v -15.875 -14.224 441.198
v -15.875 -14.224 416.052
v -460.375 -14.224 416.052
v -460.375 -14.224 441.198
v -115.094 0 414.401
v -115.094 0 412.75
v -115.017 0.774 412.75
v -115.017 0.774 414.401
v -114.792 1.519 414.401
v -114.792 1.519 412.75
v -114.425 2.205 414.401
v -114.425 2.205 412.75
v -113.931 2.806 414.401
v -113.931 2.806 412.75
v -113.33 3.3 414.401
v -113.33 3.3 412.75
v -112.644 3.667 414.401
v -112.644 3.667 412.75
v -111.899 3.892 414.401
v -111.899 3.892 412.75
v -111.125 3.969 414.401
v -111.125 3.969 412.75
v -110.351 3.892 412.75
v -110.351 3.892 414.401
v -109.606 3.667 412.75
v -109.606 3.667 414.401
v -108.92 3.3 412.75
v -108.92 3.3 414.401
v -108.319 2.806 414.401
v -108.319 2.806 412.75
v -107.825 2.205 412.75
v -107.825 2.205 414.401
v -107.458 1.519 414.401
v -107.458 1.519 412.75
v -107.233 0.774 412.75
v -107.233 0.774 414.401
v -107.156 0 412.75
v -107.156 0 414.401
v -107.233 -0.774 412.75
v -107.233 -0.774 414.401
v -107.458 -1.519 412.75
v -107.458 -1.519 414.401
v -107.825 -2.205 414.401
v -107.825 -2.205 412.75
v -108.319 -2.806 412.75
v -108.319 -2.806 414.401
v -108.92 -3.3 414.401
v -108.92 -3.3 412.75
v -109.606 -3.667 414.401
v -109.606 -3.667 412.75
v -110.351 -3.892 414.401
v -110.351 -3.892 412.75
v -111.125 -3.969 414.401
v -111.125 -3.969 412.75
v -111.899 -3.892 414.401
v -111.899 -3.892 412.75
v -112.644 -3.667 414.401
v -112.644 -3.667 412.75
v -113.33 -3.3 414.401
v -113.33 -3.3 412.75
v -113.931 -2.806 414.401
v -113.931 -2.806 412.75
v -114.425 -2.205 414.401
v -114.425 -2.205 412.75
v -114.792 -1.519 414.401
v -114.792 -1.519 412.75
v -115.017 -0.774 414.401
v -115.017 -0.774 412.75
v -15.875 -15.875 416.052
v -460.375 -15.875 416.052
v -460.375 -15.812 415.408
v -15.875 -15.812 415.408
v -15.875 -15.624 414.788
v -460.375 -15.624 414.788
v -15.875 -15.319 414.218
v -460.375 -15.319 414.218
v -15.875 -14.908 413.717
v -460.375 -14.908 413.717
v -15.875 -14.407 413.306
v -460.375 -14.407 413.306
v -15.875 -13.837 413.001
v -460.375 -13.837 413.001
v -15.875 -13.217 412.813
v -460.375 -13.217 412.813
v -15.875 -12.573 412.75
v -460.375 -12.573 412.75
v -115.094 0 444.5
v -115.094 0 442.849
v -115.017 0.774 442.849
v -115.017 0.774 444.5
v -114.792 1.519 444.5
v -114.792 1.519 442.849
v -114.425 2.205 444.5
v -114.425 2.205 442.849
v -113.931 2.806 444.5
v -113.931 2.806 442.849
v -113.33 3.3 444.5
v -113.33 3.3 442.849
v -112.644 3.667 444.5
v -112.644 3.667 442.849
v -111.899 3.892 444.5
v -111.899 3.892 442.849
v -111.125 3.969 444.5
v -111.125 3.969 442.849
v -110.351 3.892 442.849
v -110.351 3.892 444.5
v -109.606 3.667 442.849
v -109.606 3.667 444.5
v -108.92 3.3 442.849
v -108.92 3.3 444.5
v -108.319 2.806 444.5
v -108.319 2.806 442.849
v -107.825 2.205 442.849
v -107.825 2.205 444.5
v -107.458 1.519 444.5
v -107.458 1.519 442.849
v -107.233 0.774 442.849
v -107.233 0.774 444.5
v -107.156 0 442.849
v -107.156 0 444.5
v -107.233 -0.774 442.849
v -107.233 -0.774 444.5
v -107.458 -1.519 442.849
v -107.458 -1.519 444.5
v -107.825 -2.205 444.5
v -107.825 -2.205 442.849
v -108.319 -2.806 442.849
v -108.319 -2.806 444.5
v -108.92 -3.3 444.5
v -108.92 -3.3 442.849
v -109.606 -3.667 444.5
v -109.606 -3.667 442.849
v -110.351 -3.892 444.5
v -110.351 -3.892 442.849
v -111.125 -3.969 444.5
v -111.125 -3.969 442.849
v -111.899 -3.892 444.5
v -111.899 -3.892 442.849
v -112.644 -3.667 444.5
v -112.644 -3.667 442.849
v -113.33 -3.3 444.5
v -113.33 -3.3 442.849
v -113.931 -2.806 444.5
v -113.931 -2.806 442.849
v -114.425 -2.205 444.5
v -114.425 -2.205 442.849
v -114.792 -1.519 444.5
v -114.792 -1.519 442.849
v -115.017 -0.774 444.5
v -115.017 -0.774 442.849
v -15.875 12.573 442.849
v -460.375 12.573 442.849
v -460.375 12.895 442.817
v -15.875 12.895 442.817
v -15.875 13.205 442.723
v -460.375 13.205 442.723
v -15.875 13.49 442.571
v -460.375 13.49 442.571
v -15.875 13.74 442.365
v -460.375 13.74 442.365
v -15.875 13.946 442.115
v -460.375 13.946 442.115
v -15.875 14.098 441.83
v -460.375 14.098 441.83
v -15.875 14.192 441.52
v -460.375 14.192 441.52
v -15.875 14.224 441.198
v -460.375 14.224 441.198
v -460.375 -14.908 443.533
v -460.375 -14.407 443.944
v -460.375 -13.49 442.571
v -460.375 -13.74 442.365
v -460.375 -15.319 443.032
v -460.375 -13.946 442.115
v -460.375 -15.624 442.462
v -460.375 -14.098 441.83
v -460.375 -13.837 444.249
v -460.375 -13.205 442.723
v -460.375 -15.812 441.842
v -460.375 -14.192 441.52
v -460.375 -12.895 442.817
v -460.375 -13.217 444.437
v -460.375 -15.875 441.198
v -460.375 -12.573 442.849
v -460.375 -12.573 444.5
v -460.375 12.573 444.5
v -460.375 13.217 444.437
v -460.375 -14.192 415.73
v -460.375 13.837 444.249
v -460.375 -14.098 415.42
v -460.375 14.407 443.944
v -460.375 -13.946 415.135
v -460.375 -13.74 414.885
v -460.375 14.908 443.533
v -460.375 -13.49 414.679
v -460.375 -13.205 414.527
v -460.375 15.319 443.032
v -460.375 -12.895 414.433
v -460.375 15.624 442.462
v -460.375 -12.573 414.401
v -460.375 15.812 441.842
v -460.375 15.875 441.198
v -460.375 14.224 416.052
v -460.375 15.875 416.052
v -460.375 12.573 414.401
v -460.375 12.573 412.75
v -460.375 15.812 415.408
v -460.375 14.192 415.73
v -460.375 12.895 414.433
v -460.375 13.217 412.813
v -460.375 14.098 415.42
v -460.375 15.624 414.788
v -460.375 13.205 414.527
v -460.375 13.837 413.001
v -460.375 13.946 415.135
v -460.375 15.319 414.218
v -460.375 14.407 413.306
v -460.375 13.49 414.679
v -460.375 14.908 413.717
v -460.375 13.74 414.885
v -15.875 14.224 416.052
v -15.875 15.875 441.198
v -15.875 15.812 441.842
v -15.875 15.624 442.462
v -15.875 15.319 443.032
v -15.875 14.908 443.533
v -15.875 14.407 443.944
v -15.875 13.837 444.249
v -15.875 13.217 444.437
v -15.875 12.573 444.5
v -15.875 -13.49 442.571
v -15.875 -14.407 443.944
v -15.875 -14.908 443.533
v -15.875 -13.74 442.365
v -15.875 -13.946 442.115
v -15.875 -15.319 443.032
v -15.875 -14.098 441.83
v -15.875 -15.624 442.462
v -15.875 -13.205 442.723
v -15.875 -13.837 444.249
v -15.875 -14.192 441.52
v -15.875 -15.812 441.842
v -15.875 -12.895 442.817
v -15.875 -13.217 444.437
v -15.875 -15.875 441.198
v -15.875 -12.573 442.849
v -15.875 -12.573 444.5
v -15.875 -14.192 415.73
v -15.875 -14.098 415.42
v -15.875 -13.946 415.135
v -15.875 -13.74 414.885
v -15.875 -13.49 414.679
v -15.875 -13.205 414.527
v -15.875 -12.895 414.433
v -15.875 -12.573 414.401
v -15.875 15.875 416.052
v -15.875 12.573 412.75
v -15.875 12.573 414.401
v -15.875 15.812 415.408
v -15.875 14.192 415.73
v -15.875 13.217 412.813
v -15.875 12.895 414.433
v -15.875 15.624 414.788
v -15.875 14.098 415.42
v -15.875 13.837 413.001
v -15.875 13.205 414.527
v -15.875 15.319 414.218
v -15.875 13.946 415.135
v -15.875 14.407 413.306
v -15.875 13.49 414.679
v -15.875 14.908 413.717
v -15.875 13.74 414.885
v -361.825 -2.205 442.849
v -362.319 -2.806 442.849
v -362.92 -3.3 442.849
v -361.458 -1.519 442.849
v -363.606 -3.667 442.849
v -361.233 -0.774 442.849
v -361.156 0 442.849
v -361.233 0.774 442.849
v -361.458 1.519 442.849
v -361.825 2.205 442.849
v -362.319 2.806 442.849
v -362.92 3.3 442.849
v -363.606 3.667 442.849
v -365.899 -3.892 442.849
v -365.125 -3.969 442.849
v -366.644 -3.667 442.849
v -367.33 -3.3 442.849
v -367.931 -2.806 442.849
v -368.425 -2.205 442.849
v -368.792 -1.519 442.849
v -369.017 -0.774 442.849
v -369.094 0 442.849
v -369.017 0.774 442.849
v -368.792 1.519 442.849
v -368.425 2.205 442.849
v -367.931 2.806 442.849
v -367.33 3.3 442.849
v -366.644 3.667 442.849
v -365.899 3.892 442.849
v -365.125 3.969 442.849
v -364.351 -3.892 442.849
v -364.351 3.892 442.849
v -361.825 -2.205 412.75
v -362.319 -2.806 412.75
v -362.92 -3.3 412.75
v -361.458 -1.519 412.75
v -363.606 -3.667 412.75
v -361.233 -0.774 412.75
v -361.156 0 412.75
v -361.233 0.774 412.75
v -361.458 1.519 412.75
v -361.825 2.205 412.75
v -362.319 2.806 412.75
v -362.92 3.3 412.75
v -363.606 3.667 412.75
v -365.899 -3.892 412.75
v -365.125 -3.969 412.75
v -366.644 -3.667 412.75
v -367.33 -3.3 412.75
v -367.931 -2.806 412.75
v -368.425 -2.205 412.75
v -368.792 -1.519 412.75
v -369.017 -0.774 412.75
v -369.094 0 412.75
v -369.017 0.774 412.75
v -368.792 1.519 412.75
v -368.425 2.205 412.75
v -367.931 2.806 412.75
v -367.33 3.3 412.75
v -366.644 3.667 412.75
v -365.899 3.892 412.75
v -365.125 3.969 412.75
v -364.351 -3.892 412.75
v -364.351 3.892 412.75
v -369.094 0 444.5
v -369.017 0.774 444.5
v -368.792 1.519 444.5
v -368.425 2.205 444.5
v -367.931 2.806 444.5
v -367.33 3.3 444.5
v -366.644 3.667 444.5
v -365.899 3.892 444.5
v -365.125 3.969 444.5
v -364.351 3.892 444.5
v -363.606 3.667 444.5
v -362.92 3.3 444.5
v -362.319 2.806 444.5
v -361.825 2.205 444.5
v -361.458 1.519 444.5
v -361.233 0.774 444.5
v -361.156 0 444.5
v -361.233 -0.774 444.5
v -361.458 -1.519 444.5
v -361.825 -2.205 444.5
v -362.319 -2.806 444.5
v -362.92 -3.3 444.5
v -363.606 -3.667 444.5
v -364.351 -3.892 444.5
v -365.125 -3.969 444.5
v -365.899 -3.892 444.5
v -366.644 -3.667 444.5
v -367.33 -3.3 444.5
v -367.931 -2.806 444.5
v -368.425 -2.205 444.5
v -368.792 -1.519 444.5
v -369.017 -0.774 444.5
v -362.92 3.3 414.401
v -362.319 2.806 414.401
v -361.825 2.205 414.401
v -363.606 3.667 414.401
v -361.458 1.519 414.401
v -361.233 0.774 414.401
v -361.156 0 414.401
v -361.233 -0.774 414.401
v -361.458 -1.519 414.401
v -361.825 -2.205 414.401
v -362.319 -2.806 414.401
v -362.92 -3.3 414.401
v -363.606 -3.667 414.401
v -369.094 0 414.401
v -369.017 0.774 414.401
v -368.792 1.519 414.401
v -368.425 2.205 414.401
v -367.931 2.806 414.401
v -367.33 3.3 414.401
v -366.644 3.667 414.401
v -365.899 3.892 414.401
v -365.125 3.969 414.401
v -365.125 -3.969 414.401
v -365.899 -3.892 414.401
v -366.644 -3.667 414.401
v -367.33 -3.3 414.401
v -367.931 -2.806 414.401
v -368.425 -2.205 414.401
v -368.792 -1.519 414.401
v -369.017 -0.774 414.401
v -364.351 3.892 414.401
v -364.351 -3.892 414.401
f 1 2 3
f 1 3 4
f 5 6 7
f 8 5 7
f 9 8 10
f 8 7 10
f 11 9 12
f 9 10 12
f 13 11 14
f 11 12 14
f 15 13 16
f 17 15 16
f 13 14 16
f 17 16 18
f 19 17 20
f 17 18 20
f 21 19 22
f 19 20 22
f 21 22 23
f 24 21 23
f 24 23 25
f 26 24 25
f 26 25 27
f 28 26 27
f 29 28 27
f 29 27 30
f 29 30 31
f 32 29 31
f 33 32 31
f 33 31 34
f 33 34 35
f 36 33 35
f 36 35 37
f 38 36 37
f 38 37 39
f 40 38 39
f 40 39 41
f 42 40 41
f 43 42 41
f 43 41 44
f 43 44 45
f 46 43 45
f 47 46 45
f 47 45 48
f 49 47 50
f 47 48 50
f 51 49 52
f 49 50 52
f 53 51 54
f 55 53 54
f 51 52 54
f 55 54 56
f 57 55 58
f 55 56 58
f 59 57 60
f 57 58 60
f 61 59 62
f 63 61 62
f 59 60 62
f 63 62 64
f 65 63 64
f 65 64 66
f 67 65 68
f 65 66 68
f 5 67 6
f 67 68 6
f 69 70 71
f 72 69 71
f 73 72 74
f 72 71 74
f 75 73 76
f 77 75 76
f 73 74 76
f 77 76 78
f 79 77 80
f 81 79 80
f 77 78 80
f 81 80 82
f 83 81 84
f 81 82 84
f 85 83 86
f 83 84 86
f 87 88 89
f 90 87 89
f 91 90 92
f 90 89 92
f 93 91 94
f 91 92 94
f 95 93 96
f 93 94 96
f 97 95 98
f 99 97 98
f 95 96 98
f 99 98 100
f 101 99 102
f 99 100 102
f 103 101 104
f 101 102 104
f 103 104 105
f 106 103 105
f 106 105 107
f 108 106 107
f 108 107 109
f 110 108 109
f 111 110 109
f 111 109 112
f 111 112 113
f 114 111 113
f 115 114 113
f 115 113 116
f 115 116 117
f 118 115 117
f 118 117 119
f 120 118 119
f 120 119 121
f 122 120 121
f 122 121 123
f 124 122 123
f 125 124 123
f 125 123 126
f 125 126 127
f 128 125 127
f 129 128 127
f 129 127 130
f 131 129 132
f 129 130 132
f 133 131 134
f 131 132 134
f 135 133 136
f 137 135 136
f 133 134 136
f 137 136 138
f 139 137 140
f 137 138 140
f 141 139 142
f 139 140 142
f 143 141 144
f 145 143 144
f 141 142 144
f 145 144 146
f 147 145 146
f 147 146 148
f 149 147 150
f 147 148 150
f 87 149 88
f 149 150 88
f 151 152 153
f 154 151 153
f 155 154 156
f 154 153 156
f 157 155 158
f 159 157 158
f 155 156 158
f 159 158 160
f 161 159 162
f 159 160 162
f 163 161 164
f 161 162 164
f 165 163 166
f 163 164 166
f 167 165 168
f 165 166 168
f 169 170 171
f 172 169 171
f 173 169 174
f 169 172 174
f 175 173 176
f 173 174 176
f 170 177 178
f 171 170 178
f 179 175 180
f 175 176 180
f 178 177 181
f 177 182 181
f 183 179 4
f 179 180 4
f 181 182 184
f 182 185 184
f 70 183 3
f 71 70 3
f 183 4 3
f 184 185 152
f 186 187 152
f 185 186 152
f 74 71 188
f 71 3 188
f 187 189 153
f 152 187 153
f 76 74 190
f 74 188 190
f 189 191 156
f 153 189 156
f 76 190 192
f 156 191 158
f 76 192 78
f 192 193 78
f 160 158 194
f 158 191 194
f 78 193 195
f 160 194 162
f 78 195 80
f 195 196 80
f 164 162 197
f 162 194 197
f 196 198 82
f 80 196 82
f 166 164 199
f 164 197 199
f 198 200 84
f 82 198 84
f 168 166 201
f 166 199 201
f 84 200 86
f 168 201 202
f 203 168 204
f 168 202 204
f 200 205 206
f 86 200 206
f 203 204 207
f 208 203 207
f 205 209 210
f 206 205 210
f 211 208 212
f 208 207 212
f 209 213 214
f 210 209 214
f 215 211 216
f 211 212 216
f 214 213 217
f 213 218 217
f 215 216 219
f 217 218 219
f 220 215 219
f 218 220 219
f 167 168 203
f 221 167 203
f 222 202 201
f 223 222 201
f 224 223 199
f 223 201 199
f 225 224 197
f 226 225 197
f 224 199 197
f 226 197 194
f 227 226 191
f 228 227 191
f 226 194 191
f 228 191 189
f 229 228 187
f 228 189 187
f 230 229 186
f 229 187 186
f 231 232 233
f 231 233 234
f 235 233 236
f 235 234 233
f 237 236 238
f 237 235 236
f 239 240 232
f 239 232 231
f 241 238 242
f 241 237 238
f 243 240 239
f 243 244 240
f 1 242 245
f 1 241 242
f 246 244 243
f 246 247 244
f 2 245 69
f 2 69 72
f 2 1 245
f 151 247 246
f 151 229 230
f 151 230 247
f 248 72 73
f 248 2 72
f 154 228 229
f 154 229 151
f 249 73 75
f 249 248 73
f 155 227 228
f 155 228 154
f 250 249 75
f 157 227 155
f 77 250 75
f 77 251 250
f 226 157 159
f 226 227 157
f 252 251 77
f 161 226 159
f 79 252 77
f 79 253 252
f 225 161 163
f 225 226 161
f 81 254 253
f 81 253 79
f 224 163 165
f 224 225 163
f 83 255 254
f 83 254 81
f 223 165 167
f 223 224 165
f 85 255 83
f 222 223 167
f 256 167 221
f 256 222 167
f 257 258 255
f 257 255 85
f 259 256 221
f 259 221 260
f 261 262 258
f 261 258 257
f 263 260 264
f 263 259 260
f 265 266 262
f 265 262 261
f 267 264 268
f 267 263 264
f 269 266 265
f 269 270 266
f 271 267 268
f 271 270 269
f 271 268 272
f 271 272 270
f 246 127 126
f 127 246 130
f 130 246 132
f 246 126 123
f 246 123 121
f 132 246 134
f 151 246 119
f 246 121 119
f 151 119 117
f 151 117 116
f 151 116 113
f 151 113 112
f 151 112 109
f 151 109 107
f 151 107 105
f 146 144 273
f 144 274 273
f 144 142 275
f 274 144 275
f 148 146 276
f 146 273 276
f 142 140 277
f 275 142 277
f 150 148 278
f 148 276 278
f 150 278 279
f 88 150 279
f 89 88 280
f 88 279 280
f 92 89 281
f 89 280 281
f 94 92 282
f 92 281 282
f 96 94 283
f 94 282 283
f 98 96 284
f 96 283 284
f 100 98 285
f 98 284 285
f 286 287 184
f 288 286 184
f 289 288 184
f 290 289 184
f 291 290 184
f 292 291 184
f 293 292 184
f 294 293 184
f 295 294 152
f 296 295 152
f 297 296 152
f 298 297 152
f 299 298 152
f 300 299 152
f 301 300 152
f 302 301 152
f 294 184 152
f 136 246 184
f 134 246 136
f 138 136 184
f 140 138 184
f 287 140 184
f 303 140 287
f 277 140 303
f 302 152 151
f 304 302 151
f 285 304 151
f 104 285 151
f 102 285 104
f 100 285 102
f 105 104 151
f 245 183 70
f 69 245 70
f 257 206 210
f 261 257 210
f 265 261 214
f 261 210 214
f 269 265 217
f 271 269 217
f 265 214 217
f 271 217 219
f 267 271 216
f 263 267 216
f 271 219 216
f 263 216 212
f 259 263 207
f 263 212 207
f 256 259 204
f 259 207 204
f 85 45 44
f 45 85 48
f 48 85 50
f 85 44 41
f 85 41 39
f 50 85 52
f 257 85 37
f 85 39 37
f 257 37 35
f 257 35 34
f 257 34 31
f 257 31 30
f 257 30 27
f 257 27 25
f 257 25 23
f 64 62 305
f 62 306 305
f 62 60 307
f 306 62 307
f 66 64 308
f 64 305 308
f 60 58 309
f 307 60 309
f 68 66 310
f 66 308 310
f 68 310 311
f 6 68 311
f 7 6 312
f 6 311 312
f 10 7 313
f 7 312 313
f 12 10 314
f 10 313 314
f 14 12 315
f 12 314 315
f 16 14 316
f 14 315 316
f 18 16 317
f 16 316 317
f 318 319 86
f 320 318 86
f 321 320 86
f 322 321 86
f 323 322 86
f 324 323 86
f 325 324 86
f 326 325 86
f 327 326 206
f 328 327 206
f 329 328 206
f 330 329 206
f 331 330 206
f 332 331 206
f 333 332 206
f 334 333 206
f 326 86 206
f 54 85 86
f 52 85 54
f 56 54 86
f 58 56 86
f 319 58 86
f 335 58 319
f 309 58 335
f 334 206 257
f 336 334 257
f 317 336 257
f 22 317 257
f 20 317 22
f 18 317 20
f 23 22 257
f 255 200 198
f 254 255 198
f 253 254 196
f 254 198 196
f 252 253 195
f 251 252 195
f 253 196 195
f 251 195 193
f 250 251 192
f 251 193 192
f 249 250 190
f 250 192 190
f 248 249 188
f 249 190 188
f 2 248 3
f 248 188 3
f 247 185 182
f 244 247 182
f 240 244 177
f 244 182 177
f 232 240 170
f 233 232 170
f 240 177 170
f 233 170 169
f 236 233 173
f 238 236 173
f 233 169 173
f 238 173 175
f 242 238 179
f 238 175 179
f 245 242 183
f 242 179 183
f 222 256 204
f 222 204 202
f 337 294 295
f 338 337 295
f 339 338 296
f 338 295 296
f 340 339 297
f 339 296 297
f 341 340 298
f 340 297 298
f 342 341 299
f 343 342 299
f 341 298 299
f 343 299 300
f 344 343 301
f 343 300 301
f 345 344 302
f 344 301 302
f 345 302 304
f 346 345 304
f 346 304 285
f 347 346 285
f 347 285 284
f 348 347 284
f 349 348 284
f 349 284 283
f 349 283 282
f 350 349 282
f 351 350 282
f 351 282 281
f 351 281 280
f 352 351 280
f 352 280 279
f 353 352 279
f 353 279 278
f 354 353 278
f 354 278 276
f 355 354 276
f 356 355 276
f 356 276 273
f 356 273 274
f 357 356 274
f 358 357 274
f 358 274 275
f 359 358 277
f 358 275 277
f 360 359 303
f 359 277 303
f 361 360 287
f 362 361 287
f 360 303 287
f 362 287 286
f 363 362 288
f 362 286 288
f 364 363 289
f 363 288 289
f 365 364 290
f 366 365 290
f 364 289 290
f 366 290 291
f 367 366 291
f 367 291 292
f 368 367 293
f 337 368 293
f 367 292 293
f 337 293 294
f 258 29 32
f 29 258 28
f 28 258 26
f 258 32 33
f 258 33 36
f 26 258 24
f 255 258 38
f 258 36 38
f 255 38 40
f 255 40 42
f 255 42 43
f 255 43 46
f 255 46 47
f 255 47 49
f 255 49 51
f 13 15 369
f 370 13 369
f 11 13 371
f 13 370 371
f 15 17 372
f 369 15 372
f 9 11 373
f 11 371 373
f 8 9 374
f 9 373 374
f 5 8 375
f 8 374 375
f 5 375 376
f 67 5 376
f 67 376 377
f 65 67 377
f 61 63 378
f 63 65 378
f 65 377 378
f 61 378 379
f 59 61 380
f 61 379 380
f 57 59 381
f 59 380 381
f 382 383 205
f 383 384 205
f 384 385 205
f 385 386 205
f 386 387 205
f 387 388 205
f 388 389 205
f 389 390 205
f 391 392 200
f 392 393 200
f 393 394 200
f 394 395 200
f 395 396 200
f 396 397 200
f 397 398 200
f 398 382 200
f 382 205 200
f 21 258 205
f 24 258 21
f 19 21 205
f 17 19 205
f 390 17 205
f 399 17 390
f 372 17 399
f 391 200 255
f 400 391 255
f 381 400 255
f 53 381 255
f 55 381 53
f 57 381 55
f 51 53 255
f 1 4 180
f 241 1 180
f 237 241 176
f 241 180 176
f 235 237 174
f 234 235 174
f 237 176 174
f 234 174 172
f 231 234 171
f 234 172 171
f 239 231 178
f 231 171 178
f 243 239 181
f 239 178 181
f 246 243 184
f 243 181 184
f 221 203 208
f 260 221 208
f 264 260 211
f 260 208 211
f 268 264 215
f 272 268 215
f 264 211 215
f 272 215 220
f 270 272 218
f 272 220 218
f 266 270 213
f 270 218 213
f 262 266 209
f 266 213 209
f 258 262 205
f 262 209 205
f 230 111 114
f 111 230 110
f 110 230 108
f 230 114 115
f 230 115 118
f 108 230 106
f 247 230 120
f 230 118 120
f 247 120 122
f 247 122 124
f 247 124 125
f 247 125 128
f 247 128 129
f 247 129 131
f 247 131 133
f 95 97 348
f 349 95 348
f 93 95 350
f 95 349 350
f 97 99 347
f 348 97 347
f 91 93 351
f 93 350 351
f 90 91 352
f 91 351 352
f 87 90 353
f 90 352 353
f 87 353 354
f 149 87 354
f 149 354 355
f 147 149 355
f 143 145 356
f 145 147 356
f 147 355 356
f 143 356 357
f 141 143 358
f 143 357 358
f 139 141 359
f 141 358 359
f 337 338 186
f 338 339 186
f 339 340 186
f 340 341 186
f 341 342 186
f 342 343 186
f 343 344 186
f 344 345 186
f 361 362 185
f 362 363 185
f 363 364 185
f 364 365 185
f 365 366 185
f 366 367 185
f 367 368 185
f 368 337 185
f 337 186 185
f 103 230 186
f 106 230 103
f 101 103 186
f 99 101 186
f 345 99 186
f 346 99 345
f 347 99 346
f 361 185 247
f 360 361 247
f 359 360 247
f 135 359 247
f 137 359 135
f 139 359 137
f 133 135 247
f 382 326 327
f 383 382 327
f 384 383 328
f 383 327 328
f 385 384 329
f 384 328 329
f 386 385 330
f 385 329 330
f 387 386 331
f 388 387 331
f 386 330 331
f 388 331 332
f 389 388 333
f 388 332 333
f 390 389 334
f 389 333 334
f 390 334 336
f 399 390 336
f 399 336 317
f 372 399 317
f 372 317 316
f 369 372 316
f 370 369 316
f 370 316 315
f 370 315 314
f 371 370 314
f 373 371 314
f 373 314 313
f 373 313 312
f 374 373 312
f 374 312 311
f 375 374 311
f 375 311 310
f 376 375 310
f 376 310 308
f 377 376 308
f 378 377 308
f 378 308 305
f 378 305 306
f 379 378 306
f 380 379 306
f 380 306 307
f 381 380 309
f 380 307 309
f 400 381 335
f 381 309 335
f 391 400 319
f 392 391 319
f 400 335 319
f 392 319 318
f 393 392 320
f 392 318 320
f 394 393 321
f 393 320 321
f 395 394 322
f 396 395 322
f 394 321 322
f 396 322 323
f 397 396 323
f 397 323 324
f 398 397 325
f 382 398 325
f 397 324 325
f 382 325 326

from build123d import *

# Parameters (mm, degrees)
F2_DEPTH = 444.5
F3_ANGLE = 90
F5_D     = 7.9375


# Not quite as in the source:
# - a variable given as a bare number and used for a length is read in inches; the dataset says mm whatever the document's units were


with BuildPart() as f2:
    # F0 (on Top) → F2 (new body)
    with BuildSketch(Plane.XY):
        with BuildLine():
            Line((-12.573, -15.875), (12.573, -15.875))
            ThreePointArc((12.573, -15.875), (14.9078665915, -14.9078665915), (15.875, -12.573))
            Line((15.875, -12.573), (15.875, 12.573))
            ThreePointArc((15.875, 12.573), (14.9078665915, 14.9078665915), (12.573, 15.875))
            Line((12.573, 15.875), (-12.573, 15.875))
            ThreePointArc((-12.573, 15.875), (-14.9078665915, 14.9078665915), (-15.875, 12.573))
            Line((-15.875, 12.573), (-15.875, -12.573))
            ThreePointArc((-15.875, -12.573), (-14.9078665915, -14.9078665915), (-12.573, -15.875))
        make_face()
        with BuildLine():
            Line((-12.573, 14.224), (12.573, 14.224))
            ThreePointArc((12.573, 14.224), (13.7404332957, 13.7404332957), (14.224, 12.573))
            Line((14.224, 12.573), (14.224, -12.573))
            ThreePointArc((14.224, -12.573), (13.7404332957, -13.7404332957), (12.573, -14.224))
            Line((12.573, -14.224), (-12.573, -14.224))
            ThreePointArc((-12.573, -14.224), (-13.7404332957, -13.7404332957), (-14.224, -12.573))
            Line((-14.224, -12.573), (-14.224, 12.573))
            ThreePointArc((-14.224, 12.573), (-13.7404332957, 13.7404332957), (-12.573, 14.224))
        make_face(mode=Mode.SUBTRACT)
    extrude(amount=F2_DEPTH)


with BuildPart() as f2_1:
    # F3: moved
    add(f2.part.rotate(Axis((-15.875, 0, 444.5), (0, 1, 0)), F3_ANGLE))

    # F5 (through all)
    with Locations(Plane.XY.offset(444.5)):
        with Locations((-365.125, 0), (-111.125, 0)):
            Hole(F5_D / 2)


solid = f2_1.part
